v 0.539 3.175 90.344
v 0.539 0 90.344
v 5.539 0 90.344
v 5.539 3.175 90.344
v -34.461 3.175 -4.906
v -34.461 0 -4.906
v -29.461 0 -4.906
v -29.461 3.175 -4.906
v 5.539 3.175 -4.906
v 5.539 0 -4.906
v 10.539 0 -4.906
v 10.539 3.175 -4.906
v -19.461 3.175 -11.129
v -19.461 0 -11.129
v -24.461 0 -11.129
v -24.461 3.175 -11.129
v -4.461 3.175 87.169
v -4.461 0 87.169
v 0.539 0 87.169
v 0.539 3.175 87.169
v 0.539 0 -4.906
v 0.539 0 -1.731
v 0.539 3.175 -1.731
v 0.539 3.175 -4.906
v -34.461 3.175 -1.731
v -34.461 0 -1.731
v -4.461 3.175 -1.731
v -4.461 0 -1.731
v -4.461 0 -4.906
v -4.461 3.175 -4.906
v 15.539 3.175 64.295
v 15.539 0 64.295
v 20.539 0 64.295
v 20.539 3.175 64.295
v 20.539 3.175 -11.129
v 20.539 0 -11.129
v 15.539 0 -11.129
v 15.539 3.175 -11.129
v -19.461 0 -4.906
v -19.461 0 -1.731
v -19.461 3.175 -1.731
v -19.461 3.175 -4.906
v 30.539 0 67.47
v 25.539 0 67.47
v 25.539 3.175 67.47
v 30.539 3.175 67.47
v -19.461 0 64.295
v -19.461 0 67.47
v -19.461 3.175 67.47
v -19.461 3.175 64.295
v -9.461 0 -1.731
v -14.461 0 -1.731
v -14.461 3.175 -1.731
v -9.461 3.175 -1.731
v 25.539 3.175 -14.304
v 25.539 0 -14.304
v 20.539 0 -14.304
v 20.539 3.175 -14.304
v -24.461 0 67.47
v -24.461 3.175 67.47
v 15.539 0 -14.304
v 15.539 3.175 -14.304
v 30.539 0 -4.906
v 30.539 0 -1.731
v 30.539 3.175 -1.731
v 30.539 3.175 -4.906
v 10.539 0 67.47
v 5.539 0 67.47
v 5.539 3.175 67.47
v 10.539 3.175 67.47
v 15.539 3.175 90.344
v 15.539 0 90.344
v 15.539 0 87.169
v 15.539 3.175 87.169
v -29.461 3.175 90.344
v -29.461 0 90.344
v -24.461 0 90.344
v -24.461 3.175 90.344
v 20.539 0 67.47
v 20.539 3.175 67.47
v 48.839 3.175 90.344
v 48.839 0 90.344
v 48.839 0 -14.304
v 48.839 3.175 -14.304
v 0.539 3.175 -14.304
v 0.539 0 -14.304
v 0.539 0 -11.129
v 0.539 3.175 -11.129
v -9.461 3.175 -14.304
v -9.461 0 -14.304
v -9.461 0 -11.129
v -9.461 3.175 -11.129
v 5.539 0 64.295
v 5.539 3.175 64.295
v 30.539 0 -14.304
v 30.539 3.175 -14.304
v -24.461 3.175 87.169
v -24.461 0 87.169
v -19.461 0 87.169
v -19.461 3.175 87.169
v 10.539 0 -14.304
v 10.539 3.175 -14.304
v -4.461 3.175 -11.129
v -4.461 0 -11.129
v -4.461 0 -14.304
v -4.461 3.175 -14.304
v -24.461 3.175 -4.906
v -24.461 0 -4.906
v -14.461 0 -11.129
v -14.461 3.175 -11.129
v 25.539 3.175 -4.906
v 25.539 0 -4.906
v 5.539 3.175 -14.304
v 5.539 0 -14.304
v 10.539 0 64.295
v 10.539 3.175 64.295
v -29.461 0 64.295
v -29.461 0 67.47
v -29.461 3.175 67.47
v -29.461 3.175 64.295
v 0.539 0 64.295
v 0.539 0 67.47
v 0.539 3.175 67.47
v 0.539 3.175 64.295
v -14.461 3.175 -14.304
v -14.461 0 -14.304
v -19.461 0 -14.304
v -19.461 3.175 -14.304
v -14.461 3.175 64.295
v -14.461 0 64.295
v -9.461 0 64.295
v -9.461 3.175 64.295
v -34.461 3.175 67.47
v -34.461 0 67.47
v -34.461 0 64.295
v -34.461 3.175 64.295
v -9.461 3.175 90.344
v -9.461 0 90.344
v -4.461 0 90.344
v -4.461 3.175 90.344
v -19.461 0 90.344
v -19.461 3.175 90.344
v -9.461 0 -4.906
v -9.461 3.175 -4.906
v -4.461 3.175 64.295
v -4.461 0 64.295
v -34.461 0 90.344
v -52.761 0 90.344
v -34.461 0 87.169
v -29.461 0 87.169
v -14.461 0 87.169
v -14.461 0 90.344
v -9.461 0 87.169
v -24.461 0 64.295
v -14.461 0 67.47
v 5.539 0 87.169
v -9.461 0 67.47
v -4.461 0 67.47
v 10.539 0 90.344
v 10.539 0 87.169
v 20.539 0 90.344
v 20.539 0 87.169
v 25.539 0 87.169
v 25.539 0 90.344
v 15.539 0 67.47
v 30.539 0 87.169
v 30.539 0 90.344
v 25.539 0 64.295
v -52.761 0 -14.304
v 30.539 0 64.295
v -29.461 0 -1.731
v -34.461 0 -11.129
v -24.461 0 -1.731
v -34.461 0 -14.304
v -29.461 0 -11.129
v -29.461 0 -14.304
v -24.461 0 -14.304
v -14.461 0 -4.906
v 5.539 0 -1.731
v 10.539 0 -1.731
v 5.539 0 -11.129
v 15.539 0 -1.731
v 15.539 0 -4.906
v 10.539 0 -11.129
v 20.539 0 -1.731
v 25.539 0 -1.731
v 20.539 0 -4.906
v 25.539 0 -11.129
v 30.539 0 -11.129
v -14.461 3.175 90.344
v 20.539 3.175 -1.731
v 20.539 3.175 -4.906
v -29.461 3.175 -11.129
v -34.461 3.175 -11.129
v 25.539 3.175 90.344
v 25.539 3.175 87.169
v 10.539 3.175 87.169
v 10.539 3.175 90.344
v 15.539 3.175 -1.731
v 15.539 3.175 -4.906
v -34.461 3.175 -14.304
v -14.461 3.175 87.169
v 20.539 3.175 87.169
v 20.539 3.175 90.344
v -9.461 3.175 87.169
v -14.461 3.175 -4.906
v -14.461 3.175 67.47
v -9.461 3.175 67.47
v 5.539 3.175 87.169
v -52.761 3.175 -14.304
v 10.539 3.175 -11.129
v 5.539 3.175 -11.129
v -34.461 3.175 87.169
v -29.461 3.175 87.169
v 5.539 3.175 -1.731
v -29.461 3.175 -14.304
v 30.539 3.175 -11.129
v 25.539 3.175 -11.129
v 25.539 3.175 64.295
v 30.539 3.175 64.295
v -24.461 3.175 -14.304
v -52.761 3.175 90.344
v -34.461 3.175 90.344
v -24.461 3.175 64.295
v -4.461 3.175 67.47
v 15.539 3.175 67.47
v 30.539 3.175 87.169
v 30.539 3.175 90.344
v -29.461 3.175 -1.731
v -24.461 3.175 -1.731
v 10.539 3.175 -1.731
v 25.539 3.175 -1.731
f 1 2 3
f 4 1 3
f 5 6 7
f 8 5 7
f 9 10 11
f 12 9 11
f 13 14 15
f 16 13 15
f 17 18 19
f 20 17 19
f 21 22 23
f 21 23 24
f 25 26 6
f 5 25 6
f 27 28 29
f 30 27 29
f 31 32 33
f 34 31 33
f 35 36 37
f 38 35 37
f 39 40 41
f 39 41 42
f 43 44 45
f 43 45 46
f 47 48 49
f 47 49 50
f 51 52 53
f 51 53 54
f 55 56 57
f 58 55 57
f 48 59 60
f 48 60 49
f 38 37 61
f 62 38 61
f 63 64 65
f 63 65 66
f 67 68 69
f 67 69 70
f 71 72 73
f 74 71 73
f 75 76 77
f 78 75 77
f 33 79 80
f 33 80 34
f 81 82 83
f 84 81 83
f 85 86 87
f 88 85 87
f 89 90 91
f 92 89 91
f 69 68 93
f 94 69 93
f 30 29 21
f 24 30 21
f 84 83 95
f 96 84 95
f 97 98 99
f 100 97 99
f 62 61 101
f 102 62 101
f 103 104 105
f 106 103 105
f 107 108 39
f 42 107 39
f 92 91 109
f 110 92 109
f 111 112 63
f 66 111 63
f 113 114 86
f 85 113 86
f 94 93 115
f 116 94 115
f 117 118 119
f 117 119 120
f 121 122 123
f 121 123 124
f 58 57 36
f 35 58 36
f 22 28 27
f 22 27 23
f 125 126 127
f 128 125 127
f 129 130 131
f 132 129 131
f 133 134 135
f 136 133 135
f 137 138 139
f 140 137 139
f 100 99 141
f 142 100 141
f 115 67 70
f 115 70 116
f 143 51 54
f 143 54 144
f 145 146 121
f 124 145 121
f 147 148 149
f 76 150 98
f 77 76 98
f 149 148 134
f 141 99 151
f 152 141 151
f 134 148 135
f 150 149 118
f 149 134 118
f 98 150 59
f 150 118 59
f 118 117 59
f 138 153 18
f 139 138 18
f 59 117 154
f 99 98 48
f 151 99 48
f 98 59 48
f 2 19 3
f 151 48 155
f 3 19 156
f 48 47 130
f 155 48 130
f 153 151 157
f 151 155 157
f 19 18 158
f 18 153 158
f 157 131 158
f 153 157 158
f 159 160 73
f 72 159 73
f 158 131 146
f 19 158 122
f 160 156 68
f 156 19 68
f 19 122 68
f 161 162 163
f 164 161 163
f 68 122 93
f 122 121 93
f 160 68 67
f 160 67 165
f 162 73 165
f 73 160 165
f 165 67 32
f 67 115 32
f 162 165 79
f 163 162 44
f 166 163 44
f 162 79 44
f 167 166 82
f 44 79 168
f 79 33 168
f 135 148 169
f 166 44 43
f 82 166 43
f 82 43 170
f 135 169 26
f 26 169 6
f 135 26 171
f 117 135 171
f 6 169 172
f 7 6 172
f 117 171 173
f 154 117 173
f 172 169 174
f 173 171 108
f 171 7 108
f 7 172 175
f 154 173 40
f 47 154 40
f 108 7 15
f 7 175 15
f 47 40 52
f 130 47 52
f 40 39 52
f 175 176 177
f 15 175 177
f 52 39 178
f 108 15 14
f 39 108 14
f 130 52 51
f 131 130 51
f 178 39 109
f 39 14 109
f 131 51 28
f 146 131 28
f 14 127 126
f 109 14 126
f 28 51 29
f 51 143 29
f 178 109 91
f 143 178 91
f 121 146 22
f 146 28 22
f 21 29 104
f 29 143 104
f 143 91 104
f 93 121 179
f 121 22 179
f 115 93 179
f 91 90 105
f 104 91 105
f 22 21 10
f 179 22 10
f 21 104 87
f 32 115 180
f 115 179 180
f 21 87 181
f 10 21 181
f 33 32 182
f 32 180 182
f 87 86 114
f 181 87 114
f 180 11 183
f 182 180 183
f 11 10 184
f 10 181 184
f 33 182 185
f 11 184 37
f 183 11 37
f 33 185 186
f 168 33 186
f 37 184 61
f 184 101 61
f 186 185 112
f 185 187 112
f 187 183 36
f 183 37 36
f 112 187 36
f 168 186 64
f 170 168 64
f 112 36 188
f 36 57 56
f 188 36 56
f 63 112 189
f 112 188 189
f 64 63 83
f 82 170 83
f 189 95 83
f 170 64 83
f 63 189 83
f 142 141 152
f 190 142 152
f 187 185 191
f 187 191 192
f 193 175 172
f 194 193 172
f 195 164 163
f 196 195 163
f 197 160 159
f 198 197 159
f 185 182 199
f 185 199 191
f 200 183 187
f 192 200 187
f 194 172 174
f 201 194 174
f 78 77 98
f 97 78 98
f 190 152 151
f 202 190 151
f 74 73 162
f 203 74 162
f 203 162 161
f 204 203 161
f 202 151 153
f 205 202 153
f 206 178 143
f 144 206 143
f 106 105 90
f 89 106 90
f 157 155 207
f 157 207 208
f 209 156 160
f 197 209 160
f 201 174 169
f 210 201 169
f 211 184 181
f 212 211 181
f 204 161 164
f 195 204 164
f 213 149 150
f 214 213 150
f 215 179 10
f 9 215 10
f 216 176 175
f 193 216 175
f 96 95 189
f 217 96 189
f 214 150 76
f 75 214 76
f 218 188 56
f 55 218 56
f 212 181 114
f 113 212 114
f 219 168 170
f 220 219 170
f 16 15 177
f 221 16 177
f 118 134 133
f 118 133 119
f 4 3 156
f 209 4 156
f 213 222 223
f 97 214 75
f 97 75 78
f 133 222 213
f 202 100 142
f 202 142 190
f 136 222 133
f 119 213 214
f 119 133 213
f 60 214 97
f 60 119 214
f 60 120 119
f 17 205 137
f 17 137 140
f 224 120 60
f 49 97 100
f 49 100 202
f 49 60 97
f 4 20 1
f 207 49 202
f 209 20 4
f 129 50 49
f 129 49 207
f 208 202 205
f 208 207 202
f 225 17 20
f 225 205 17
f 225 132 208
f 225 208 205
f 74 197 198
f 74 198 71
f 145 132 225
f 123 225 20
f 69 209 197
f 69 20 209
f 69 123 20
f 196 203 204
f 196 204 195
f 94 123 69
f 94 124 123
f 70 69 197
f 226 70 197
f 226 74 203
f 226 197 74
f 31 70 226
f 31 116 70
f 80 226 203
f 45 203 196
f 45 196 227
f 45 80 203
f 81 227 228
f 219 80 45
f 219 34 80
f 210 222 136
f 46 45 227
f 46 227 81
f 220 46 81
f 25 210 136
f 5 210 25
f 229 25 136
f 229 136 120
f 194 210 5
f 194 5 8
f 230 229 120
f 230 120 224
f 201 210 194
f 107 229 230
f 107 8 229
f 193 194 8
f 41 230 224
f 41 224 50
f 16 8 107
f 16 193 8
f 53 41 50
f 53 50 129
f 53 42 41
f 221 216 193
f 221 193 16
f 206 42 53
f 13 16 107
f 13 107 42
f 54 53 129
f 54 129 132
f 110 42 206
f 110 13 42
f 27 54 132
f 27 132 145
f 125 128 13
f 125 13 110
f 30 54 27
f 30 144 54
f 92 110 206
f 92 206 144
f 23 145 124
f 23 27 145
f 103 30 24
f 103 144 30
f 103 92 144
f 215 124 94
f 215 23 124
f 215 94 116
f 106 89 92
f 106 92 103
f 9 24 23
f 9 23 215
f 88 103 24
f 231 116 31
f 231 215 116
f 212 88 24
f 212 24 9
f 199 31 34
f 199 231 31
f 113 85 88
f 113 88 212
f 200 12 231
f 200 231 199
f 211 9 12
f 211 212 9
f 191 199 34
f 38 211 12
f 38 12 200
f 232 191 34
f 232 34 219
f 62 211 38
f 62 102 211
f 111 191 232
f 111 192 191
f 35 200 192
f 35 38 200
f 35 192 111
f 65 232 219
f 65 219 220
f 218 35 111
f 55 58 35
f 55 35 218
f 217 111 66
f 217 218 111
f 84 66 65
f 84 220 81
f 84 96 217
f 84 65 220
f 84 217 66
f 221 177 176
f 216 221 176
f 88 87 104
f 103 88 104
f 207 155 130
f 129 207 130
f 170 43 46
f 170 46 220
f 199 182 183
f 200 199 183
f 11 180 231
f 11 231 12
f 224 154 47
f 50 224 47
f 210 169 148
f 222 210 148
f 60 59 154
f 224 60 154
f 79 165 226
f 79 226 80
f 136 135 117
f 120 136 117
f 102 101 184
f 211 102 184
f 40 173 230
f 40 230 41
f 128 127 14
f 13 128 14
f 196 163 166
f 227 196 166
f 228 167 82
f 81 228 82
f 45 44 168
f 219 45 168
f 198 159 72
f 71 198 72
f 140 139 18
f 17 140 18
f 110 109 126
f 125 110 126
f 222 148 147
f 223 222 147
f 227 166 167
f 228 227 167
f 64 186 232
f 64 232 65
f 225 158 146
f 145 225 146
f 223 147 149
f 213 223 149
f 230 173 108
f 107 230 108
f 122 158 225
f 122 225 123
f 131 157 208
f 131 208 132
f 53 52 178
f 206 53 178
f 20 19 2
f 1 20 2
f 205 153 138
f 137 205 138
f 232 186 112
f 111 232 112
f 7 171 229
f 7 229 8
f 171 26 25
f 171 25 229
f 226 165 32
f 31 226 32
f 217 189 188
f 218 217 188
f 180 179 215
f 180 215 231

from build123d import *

# Parameters (mm, degrees)
SKETCH1_W           = 5
SKETCH1_H           = 3.175
BOSS_EXTRUDE1_DEPTH = 3.175


with BuildPart() as part:
    # Sketch1 → Boss-Extrude1 (new body)
    with BuildSketch(Plane(origin=(0, 0, 0), x_dir=(1, 0, 0), z_dir=(0, 1, 0))):
        Polygon((-34.46085268, -90.343789474), (-34.46085268, -87.168789474), (-29.46085268, -87.168789474), (-29.46085268, -90.343789474), (-24.46085268, -90.343789474), (-24.46085268, -87.168789474), (-19.46085268, -87.168789474), (-19.46085268, -90.343789474), (-14.46085268, -90.343789474), (-14.46085268, -87.168789474), (-9.46085268, -87.168789474), (-9.46085268, -90.343789474), (-4.46085268, -90.343789474), (-4.46085268, -87.168789474), (0.53914732, -87.168789474), (0.53914732, -90.343789474), (5.53914732, -90.343789474), (5.53914732, -87.168789474), (10.53914732, -87.168789474), (10.53914732, -90.343789474), (15.53914732, -90.343789474), (15.53914732, -87.168789474), (20.53914732, -87.168789474), (20.53914732, -90.343789474), (25.53914732, -90.343789474), (25.53914732, -87.168789474), (30.53914732, -87.168789474), (30.53914732, -90.343789474), (48.83914732, -90.343789474), (48.83914732, 14.304210526), (30.53914732, 14.304210526), (30.53914732, 11.129210526), (25.53914732, 11.129210526), (25.53914732, 14.304210526), (20.53914732, 14.304210526), (20.53914732, 11.129210526), (15.53914732, 11.129210526), (15.53914732, 14.304210526), (10.53914732, 14.304210526), (10.53914732, 11.129210526), (5.53914732, 11.129210526), (5.53914732, 14.304210526), (0.53914732, 14.304210526), (0.53914732, 11.129210526), (-4.46085268, 11.129210526), (-4.46085268, 14.304210526), (-9.46085268, 14.304210526), (-9.46085268, 11.129210526), (-14.46085268, 11.129210526), (-14.46085268, 14.304210526), (-19.46085268, 14.304210526), (-19.46085268, 11.129210526), (-24.46085268, 11.129210526), (-24.46085268, 14.304210526), (-29.46085268, 14.304210526), (-29.46085268, 11.129210526), (-34.46085268, 11.129210526), (-34.46085268, 14.304210526), (-52.76085268, 14.304210526), (-52.76085268, -90.343789474), align=None)
        with Locations((-21.96085268, 3.318710526)):
            Rectangle(SKETCH1_W, SKETCH1_H, mode=Mode.SUBTRACT)
        with Locations((-31.96085268, 3.318710526)):
            Rectangle(SKETCH1_W, SKETCH1_H, mode=Mode.SUBTRACT)
        with Locations((-11.96085268, 3.318710526)):
            Rectangle(SKETCH1_W, SKETCH1_H, mode=Mode.SUBTRACT)
        with Locations((-1.96085268, 3.318710526)):
            Rectangle(SKETCH1_W, SKETCH1_H, mode=Mode.SUBTRACT)
        with Locations((8.03914732, 3.318710526)):
            Rectangle(SKETCH1_W, SKETCH1_H, mode=Mode.SUBTRACT)
        with Locations((18.03914732, 3.318710526)):
            Rectangle(SKETCH1_W, SKETCH1_H, mode=Mode.SUBTRACT)
        with Locations((28.03914732, 3.318710526)):
            Rectangle(SKETCH1_W, SKETCH1_H, mode=Mode.SUBTRACT)
        with Locations((-21.96085268, -65.882289474)):
            Rectangle(SKETCH1_W, SKETCH1_H, mode=Mode.SUBTRACT)
        with Locations((-31.96085268, -65.882289474)):
            Rectangle(SKETCH1_W, SKETCH1_H, mode=Mode.SUBTRACT)
        with Locations((-11.96085268, -65.882289474)):
            Rectangle(SKETCH1_W, SKETCH1_H, mode=Mode.SUBTRACT)
        with Locations((-1.96085268, -65.882289474)):
            Rectangle(SKETCH1_W, SKETCH1_H, mode=Mode.SUBTRACT)
        with Locations((8.03914732, -65.882289474)):
            Rectangle(SKETCH1_W, SKETCH1_H, mode=Mode.SUBTRACT)
        with Locations((18.03914732, -65.882289474)):
            Rectangle(SKETCH1_W, SKETCH1_H, mode=Mode.SUBTRACT)
        with Locations((28.03914732, -65.882289474)):
            Rectangle(SKETCH1_W, SKETCH1_H, mode=Mode.SUBTRACT)
    extrude(amount=BOSS_EXTRUDE1_DEPTH)


solid = part.part
